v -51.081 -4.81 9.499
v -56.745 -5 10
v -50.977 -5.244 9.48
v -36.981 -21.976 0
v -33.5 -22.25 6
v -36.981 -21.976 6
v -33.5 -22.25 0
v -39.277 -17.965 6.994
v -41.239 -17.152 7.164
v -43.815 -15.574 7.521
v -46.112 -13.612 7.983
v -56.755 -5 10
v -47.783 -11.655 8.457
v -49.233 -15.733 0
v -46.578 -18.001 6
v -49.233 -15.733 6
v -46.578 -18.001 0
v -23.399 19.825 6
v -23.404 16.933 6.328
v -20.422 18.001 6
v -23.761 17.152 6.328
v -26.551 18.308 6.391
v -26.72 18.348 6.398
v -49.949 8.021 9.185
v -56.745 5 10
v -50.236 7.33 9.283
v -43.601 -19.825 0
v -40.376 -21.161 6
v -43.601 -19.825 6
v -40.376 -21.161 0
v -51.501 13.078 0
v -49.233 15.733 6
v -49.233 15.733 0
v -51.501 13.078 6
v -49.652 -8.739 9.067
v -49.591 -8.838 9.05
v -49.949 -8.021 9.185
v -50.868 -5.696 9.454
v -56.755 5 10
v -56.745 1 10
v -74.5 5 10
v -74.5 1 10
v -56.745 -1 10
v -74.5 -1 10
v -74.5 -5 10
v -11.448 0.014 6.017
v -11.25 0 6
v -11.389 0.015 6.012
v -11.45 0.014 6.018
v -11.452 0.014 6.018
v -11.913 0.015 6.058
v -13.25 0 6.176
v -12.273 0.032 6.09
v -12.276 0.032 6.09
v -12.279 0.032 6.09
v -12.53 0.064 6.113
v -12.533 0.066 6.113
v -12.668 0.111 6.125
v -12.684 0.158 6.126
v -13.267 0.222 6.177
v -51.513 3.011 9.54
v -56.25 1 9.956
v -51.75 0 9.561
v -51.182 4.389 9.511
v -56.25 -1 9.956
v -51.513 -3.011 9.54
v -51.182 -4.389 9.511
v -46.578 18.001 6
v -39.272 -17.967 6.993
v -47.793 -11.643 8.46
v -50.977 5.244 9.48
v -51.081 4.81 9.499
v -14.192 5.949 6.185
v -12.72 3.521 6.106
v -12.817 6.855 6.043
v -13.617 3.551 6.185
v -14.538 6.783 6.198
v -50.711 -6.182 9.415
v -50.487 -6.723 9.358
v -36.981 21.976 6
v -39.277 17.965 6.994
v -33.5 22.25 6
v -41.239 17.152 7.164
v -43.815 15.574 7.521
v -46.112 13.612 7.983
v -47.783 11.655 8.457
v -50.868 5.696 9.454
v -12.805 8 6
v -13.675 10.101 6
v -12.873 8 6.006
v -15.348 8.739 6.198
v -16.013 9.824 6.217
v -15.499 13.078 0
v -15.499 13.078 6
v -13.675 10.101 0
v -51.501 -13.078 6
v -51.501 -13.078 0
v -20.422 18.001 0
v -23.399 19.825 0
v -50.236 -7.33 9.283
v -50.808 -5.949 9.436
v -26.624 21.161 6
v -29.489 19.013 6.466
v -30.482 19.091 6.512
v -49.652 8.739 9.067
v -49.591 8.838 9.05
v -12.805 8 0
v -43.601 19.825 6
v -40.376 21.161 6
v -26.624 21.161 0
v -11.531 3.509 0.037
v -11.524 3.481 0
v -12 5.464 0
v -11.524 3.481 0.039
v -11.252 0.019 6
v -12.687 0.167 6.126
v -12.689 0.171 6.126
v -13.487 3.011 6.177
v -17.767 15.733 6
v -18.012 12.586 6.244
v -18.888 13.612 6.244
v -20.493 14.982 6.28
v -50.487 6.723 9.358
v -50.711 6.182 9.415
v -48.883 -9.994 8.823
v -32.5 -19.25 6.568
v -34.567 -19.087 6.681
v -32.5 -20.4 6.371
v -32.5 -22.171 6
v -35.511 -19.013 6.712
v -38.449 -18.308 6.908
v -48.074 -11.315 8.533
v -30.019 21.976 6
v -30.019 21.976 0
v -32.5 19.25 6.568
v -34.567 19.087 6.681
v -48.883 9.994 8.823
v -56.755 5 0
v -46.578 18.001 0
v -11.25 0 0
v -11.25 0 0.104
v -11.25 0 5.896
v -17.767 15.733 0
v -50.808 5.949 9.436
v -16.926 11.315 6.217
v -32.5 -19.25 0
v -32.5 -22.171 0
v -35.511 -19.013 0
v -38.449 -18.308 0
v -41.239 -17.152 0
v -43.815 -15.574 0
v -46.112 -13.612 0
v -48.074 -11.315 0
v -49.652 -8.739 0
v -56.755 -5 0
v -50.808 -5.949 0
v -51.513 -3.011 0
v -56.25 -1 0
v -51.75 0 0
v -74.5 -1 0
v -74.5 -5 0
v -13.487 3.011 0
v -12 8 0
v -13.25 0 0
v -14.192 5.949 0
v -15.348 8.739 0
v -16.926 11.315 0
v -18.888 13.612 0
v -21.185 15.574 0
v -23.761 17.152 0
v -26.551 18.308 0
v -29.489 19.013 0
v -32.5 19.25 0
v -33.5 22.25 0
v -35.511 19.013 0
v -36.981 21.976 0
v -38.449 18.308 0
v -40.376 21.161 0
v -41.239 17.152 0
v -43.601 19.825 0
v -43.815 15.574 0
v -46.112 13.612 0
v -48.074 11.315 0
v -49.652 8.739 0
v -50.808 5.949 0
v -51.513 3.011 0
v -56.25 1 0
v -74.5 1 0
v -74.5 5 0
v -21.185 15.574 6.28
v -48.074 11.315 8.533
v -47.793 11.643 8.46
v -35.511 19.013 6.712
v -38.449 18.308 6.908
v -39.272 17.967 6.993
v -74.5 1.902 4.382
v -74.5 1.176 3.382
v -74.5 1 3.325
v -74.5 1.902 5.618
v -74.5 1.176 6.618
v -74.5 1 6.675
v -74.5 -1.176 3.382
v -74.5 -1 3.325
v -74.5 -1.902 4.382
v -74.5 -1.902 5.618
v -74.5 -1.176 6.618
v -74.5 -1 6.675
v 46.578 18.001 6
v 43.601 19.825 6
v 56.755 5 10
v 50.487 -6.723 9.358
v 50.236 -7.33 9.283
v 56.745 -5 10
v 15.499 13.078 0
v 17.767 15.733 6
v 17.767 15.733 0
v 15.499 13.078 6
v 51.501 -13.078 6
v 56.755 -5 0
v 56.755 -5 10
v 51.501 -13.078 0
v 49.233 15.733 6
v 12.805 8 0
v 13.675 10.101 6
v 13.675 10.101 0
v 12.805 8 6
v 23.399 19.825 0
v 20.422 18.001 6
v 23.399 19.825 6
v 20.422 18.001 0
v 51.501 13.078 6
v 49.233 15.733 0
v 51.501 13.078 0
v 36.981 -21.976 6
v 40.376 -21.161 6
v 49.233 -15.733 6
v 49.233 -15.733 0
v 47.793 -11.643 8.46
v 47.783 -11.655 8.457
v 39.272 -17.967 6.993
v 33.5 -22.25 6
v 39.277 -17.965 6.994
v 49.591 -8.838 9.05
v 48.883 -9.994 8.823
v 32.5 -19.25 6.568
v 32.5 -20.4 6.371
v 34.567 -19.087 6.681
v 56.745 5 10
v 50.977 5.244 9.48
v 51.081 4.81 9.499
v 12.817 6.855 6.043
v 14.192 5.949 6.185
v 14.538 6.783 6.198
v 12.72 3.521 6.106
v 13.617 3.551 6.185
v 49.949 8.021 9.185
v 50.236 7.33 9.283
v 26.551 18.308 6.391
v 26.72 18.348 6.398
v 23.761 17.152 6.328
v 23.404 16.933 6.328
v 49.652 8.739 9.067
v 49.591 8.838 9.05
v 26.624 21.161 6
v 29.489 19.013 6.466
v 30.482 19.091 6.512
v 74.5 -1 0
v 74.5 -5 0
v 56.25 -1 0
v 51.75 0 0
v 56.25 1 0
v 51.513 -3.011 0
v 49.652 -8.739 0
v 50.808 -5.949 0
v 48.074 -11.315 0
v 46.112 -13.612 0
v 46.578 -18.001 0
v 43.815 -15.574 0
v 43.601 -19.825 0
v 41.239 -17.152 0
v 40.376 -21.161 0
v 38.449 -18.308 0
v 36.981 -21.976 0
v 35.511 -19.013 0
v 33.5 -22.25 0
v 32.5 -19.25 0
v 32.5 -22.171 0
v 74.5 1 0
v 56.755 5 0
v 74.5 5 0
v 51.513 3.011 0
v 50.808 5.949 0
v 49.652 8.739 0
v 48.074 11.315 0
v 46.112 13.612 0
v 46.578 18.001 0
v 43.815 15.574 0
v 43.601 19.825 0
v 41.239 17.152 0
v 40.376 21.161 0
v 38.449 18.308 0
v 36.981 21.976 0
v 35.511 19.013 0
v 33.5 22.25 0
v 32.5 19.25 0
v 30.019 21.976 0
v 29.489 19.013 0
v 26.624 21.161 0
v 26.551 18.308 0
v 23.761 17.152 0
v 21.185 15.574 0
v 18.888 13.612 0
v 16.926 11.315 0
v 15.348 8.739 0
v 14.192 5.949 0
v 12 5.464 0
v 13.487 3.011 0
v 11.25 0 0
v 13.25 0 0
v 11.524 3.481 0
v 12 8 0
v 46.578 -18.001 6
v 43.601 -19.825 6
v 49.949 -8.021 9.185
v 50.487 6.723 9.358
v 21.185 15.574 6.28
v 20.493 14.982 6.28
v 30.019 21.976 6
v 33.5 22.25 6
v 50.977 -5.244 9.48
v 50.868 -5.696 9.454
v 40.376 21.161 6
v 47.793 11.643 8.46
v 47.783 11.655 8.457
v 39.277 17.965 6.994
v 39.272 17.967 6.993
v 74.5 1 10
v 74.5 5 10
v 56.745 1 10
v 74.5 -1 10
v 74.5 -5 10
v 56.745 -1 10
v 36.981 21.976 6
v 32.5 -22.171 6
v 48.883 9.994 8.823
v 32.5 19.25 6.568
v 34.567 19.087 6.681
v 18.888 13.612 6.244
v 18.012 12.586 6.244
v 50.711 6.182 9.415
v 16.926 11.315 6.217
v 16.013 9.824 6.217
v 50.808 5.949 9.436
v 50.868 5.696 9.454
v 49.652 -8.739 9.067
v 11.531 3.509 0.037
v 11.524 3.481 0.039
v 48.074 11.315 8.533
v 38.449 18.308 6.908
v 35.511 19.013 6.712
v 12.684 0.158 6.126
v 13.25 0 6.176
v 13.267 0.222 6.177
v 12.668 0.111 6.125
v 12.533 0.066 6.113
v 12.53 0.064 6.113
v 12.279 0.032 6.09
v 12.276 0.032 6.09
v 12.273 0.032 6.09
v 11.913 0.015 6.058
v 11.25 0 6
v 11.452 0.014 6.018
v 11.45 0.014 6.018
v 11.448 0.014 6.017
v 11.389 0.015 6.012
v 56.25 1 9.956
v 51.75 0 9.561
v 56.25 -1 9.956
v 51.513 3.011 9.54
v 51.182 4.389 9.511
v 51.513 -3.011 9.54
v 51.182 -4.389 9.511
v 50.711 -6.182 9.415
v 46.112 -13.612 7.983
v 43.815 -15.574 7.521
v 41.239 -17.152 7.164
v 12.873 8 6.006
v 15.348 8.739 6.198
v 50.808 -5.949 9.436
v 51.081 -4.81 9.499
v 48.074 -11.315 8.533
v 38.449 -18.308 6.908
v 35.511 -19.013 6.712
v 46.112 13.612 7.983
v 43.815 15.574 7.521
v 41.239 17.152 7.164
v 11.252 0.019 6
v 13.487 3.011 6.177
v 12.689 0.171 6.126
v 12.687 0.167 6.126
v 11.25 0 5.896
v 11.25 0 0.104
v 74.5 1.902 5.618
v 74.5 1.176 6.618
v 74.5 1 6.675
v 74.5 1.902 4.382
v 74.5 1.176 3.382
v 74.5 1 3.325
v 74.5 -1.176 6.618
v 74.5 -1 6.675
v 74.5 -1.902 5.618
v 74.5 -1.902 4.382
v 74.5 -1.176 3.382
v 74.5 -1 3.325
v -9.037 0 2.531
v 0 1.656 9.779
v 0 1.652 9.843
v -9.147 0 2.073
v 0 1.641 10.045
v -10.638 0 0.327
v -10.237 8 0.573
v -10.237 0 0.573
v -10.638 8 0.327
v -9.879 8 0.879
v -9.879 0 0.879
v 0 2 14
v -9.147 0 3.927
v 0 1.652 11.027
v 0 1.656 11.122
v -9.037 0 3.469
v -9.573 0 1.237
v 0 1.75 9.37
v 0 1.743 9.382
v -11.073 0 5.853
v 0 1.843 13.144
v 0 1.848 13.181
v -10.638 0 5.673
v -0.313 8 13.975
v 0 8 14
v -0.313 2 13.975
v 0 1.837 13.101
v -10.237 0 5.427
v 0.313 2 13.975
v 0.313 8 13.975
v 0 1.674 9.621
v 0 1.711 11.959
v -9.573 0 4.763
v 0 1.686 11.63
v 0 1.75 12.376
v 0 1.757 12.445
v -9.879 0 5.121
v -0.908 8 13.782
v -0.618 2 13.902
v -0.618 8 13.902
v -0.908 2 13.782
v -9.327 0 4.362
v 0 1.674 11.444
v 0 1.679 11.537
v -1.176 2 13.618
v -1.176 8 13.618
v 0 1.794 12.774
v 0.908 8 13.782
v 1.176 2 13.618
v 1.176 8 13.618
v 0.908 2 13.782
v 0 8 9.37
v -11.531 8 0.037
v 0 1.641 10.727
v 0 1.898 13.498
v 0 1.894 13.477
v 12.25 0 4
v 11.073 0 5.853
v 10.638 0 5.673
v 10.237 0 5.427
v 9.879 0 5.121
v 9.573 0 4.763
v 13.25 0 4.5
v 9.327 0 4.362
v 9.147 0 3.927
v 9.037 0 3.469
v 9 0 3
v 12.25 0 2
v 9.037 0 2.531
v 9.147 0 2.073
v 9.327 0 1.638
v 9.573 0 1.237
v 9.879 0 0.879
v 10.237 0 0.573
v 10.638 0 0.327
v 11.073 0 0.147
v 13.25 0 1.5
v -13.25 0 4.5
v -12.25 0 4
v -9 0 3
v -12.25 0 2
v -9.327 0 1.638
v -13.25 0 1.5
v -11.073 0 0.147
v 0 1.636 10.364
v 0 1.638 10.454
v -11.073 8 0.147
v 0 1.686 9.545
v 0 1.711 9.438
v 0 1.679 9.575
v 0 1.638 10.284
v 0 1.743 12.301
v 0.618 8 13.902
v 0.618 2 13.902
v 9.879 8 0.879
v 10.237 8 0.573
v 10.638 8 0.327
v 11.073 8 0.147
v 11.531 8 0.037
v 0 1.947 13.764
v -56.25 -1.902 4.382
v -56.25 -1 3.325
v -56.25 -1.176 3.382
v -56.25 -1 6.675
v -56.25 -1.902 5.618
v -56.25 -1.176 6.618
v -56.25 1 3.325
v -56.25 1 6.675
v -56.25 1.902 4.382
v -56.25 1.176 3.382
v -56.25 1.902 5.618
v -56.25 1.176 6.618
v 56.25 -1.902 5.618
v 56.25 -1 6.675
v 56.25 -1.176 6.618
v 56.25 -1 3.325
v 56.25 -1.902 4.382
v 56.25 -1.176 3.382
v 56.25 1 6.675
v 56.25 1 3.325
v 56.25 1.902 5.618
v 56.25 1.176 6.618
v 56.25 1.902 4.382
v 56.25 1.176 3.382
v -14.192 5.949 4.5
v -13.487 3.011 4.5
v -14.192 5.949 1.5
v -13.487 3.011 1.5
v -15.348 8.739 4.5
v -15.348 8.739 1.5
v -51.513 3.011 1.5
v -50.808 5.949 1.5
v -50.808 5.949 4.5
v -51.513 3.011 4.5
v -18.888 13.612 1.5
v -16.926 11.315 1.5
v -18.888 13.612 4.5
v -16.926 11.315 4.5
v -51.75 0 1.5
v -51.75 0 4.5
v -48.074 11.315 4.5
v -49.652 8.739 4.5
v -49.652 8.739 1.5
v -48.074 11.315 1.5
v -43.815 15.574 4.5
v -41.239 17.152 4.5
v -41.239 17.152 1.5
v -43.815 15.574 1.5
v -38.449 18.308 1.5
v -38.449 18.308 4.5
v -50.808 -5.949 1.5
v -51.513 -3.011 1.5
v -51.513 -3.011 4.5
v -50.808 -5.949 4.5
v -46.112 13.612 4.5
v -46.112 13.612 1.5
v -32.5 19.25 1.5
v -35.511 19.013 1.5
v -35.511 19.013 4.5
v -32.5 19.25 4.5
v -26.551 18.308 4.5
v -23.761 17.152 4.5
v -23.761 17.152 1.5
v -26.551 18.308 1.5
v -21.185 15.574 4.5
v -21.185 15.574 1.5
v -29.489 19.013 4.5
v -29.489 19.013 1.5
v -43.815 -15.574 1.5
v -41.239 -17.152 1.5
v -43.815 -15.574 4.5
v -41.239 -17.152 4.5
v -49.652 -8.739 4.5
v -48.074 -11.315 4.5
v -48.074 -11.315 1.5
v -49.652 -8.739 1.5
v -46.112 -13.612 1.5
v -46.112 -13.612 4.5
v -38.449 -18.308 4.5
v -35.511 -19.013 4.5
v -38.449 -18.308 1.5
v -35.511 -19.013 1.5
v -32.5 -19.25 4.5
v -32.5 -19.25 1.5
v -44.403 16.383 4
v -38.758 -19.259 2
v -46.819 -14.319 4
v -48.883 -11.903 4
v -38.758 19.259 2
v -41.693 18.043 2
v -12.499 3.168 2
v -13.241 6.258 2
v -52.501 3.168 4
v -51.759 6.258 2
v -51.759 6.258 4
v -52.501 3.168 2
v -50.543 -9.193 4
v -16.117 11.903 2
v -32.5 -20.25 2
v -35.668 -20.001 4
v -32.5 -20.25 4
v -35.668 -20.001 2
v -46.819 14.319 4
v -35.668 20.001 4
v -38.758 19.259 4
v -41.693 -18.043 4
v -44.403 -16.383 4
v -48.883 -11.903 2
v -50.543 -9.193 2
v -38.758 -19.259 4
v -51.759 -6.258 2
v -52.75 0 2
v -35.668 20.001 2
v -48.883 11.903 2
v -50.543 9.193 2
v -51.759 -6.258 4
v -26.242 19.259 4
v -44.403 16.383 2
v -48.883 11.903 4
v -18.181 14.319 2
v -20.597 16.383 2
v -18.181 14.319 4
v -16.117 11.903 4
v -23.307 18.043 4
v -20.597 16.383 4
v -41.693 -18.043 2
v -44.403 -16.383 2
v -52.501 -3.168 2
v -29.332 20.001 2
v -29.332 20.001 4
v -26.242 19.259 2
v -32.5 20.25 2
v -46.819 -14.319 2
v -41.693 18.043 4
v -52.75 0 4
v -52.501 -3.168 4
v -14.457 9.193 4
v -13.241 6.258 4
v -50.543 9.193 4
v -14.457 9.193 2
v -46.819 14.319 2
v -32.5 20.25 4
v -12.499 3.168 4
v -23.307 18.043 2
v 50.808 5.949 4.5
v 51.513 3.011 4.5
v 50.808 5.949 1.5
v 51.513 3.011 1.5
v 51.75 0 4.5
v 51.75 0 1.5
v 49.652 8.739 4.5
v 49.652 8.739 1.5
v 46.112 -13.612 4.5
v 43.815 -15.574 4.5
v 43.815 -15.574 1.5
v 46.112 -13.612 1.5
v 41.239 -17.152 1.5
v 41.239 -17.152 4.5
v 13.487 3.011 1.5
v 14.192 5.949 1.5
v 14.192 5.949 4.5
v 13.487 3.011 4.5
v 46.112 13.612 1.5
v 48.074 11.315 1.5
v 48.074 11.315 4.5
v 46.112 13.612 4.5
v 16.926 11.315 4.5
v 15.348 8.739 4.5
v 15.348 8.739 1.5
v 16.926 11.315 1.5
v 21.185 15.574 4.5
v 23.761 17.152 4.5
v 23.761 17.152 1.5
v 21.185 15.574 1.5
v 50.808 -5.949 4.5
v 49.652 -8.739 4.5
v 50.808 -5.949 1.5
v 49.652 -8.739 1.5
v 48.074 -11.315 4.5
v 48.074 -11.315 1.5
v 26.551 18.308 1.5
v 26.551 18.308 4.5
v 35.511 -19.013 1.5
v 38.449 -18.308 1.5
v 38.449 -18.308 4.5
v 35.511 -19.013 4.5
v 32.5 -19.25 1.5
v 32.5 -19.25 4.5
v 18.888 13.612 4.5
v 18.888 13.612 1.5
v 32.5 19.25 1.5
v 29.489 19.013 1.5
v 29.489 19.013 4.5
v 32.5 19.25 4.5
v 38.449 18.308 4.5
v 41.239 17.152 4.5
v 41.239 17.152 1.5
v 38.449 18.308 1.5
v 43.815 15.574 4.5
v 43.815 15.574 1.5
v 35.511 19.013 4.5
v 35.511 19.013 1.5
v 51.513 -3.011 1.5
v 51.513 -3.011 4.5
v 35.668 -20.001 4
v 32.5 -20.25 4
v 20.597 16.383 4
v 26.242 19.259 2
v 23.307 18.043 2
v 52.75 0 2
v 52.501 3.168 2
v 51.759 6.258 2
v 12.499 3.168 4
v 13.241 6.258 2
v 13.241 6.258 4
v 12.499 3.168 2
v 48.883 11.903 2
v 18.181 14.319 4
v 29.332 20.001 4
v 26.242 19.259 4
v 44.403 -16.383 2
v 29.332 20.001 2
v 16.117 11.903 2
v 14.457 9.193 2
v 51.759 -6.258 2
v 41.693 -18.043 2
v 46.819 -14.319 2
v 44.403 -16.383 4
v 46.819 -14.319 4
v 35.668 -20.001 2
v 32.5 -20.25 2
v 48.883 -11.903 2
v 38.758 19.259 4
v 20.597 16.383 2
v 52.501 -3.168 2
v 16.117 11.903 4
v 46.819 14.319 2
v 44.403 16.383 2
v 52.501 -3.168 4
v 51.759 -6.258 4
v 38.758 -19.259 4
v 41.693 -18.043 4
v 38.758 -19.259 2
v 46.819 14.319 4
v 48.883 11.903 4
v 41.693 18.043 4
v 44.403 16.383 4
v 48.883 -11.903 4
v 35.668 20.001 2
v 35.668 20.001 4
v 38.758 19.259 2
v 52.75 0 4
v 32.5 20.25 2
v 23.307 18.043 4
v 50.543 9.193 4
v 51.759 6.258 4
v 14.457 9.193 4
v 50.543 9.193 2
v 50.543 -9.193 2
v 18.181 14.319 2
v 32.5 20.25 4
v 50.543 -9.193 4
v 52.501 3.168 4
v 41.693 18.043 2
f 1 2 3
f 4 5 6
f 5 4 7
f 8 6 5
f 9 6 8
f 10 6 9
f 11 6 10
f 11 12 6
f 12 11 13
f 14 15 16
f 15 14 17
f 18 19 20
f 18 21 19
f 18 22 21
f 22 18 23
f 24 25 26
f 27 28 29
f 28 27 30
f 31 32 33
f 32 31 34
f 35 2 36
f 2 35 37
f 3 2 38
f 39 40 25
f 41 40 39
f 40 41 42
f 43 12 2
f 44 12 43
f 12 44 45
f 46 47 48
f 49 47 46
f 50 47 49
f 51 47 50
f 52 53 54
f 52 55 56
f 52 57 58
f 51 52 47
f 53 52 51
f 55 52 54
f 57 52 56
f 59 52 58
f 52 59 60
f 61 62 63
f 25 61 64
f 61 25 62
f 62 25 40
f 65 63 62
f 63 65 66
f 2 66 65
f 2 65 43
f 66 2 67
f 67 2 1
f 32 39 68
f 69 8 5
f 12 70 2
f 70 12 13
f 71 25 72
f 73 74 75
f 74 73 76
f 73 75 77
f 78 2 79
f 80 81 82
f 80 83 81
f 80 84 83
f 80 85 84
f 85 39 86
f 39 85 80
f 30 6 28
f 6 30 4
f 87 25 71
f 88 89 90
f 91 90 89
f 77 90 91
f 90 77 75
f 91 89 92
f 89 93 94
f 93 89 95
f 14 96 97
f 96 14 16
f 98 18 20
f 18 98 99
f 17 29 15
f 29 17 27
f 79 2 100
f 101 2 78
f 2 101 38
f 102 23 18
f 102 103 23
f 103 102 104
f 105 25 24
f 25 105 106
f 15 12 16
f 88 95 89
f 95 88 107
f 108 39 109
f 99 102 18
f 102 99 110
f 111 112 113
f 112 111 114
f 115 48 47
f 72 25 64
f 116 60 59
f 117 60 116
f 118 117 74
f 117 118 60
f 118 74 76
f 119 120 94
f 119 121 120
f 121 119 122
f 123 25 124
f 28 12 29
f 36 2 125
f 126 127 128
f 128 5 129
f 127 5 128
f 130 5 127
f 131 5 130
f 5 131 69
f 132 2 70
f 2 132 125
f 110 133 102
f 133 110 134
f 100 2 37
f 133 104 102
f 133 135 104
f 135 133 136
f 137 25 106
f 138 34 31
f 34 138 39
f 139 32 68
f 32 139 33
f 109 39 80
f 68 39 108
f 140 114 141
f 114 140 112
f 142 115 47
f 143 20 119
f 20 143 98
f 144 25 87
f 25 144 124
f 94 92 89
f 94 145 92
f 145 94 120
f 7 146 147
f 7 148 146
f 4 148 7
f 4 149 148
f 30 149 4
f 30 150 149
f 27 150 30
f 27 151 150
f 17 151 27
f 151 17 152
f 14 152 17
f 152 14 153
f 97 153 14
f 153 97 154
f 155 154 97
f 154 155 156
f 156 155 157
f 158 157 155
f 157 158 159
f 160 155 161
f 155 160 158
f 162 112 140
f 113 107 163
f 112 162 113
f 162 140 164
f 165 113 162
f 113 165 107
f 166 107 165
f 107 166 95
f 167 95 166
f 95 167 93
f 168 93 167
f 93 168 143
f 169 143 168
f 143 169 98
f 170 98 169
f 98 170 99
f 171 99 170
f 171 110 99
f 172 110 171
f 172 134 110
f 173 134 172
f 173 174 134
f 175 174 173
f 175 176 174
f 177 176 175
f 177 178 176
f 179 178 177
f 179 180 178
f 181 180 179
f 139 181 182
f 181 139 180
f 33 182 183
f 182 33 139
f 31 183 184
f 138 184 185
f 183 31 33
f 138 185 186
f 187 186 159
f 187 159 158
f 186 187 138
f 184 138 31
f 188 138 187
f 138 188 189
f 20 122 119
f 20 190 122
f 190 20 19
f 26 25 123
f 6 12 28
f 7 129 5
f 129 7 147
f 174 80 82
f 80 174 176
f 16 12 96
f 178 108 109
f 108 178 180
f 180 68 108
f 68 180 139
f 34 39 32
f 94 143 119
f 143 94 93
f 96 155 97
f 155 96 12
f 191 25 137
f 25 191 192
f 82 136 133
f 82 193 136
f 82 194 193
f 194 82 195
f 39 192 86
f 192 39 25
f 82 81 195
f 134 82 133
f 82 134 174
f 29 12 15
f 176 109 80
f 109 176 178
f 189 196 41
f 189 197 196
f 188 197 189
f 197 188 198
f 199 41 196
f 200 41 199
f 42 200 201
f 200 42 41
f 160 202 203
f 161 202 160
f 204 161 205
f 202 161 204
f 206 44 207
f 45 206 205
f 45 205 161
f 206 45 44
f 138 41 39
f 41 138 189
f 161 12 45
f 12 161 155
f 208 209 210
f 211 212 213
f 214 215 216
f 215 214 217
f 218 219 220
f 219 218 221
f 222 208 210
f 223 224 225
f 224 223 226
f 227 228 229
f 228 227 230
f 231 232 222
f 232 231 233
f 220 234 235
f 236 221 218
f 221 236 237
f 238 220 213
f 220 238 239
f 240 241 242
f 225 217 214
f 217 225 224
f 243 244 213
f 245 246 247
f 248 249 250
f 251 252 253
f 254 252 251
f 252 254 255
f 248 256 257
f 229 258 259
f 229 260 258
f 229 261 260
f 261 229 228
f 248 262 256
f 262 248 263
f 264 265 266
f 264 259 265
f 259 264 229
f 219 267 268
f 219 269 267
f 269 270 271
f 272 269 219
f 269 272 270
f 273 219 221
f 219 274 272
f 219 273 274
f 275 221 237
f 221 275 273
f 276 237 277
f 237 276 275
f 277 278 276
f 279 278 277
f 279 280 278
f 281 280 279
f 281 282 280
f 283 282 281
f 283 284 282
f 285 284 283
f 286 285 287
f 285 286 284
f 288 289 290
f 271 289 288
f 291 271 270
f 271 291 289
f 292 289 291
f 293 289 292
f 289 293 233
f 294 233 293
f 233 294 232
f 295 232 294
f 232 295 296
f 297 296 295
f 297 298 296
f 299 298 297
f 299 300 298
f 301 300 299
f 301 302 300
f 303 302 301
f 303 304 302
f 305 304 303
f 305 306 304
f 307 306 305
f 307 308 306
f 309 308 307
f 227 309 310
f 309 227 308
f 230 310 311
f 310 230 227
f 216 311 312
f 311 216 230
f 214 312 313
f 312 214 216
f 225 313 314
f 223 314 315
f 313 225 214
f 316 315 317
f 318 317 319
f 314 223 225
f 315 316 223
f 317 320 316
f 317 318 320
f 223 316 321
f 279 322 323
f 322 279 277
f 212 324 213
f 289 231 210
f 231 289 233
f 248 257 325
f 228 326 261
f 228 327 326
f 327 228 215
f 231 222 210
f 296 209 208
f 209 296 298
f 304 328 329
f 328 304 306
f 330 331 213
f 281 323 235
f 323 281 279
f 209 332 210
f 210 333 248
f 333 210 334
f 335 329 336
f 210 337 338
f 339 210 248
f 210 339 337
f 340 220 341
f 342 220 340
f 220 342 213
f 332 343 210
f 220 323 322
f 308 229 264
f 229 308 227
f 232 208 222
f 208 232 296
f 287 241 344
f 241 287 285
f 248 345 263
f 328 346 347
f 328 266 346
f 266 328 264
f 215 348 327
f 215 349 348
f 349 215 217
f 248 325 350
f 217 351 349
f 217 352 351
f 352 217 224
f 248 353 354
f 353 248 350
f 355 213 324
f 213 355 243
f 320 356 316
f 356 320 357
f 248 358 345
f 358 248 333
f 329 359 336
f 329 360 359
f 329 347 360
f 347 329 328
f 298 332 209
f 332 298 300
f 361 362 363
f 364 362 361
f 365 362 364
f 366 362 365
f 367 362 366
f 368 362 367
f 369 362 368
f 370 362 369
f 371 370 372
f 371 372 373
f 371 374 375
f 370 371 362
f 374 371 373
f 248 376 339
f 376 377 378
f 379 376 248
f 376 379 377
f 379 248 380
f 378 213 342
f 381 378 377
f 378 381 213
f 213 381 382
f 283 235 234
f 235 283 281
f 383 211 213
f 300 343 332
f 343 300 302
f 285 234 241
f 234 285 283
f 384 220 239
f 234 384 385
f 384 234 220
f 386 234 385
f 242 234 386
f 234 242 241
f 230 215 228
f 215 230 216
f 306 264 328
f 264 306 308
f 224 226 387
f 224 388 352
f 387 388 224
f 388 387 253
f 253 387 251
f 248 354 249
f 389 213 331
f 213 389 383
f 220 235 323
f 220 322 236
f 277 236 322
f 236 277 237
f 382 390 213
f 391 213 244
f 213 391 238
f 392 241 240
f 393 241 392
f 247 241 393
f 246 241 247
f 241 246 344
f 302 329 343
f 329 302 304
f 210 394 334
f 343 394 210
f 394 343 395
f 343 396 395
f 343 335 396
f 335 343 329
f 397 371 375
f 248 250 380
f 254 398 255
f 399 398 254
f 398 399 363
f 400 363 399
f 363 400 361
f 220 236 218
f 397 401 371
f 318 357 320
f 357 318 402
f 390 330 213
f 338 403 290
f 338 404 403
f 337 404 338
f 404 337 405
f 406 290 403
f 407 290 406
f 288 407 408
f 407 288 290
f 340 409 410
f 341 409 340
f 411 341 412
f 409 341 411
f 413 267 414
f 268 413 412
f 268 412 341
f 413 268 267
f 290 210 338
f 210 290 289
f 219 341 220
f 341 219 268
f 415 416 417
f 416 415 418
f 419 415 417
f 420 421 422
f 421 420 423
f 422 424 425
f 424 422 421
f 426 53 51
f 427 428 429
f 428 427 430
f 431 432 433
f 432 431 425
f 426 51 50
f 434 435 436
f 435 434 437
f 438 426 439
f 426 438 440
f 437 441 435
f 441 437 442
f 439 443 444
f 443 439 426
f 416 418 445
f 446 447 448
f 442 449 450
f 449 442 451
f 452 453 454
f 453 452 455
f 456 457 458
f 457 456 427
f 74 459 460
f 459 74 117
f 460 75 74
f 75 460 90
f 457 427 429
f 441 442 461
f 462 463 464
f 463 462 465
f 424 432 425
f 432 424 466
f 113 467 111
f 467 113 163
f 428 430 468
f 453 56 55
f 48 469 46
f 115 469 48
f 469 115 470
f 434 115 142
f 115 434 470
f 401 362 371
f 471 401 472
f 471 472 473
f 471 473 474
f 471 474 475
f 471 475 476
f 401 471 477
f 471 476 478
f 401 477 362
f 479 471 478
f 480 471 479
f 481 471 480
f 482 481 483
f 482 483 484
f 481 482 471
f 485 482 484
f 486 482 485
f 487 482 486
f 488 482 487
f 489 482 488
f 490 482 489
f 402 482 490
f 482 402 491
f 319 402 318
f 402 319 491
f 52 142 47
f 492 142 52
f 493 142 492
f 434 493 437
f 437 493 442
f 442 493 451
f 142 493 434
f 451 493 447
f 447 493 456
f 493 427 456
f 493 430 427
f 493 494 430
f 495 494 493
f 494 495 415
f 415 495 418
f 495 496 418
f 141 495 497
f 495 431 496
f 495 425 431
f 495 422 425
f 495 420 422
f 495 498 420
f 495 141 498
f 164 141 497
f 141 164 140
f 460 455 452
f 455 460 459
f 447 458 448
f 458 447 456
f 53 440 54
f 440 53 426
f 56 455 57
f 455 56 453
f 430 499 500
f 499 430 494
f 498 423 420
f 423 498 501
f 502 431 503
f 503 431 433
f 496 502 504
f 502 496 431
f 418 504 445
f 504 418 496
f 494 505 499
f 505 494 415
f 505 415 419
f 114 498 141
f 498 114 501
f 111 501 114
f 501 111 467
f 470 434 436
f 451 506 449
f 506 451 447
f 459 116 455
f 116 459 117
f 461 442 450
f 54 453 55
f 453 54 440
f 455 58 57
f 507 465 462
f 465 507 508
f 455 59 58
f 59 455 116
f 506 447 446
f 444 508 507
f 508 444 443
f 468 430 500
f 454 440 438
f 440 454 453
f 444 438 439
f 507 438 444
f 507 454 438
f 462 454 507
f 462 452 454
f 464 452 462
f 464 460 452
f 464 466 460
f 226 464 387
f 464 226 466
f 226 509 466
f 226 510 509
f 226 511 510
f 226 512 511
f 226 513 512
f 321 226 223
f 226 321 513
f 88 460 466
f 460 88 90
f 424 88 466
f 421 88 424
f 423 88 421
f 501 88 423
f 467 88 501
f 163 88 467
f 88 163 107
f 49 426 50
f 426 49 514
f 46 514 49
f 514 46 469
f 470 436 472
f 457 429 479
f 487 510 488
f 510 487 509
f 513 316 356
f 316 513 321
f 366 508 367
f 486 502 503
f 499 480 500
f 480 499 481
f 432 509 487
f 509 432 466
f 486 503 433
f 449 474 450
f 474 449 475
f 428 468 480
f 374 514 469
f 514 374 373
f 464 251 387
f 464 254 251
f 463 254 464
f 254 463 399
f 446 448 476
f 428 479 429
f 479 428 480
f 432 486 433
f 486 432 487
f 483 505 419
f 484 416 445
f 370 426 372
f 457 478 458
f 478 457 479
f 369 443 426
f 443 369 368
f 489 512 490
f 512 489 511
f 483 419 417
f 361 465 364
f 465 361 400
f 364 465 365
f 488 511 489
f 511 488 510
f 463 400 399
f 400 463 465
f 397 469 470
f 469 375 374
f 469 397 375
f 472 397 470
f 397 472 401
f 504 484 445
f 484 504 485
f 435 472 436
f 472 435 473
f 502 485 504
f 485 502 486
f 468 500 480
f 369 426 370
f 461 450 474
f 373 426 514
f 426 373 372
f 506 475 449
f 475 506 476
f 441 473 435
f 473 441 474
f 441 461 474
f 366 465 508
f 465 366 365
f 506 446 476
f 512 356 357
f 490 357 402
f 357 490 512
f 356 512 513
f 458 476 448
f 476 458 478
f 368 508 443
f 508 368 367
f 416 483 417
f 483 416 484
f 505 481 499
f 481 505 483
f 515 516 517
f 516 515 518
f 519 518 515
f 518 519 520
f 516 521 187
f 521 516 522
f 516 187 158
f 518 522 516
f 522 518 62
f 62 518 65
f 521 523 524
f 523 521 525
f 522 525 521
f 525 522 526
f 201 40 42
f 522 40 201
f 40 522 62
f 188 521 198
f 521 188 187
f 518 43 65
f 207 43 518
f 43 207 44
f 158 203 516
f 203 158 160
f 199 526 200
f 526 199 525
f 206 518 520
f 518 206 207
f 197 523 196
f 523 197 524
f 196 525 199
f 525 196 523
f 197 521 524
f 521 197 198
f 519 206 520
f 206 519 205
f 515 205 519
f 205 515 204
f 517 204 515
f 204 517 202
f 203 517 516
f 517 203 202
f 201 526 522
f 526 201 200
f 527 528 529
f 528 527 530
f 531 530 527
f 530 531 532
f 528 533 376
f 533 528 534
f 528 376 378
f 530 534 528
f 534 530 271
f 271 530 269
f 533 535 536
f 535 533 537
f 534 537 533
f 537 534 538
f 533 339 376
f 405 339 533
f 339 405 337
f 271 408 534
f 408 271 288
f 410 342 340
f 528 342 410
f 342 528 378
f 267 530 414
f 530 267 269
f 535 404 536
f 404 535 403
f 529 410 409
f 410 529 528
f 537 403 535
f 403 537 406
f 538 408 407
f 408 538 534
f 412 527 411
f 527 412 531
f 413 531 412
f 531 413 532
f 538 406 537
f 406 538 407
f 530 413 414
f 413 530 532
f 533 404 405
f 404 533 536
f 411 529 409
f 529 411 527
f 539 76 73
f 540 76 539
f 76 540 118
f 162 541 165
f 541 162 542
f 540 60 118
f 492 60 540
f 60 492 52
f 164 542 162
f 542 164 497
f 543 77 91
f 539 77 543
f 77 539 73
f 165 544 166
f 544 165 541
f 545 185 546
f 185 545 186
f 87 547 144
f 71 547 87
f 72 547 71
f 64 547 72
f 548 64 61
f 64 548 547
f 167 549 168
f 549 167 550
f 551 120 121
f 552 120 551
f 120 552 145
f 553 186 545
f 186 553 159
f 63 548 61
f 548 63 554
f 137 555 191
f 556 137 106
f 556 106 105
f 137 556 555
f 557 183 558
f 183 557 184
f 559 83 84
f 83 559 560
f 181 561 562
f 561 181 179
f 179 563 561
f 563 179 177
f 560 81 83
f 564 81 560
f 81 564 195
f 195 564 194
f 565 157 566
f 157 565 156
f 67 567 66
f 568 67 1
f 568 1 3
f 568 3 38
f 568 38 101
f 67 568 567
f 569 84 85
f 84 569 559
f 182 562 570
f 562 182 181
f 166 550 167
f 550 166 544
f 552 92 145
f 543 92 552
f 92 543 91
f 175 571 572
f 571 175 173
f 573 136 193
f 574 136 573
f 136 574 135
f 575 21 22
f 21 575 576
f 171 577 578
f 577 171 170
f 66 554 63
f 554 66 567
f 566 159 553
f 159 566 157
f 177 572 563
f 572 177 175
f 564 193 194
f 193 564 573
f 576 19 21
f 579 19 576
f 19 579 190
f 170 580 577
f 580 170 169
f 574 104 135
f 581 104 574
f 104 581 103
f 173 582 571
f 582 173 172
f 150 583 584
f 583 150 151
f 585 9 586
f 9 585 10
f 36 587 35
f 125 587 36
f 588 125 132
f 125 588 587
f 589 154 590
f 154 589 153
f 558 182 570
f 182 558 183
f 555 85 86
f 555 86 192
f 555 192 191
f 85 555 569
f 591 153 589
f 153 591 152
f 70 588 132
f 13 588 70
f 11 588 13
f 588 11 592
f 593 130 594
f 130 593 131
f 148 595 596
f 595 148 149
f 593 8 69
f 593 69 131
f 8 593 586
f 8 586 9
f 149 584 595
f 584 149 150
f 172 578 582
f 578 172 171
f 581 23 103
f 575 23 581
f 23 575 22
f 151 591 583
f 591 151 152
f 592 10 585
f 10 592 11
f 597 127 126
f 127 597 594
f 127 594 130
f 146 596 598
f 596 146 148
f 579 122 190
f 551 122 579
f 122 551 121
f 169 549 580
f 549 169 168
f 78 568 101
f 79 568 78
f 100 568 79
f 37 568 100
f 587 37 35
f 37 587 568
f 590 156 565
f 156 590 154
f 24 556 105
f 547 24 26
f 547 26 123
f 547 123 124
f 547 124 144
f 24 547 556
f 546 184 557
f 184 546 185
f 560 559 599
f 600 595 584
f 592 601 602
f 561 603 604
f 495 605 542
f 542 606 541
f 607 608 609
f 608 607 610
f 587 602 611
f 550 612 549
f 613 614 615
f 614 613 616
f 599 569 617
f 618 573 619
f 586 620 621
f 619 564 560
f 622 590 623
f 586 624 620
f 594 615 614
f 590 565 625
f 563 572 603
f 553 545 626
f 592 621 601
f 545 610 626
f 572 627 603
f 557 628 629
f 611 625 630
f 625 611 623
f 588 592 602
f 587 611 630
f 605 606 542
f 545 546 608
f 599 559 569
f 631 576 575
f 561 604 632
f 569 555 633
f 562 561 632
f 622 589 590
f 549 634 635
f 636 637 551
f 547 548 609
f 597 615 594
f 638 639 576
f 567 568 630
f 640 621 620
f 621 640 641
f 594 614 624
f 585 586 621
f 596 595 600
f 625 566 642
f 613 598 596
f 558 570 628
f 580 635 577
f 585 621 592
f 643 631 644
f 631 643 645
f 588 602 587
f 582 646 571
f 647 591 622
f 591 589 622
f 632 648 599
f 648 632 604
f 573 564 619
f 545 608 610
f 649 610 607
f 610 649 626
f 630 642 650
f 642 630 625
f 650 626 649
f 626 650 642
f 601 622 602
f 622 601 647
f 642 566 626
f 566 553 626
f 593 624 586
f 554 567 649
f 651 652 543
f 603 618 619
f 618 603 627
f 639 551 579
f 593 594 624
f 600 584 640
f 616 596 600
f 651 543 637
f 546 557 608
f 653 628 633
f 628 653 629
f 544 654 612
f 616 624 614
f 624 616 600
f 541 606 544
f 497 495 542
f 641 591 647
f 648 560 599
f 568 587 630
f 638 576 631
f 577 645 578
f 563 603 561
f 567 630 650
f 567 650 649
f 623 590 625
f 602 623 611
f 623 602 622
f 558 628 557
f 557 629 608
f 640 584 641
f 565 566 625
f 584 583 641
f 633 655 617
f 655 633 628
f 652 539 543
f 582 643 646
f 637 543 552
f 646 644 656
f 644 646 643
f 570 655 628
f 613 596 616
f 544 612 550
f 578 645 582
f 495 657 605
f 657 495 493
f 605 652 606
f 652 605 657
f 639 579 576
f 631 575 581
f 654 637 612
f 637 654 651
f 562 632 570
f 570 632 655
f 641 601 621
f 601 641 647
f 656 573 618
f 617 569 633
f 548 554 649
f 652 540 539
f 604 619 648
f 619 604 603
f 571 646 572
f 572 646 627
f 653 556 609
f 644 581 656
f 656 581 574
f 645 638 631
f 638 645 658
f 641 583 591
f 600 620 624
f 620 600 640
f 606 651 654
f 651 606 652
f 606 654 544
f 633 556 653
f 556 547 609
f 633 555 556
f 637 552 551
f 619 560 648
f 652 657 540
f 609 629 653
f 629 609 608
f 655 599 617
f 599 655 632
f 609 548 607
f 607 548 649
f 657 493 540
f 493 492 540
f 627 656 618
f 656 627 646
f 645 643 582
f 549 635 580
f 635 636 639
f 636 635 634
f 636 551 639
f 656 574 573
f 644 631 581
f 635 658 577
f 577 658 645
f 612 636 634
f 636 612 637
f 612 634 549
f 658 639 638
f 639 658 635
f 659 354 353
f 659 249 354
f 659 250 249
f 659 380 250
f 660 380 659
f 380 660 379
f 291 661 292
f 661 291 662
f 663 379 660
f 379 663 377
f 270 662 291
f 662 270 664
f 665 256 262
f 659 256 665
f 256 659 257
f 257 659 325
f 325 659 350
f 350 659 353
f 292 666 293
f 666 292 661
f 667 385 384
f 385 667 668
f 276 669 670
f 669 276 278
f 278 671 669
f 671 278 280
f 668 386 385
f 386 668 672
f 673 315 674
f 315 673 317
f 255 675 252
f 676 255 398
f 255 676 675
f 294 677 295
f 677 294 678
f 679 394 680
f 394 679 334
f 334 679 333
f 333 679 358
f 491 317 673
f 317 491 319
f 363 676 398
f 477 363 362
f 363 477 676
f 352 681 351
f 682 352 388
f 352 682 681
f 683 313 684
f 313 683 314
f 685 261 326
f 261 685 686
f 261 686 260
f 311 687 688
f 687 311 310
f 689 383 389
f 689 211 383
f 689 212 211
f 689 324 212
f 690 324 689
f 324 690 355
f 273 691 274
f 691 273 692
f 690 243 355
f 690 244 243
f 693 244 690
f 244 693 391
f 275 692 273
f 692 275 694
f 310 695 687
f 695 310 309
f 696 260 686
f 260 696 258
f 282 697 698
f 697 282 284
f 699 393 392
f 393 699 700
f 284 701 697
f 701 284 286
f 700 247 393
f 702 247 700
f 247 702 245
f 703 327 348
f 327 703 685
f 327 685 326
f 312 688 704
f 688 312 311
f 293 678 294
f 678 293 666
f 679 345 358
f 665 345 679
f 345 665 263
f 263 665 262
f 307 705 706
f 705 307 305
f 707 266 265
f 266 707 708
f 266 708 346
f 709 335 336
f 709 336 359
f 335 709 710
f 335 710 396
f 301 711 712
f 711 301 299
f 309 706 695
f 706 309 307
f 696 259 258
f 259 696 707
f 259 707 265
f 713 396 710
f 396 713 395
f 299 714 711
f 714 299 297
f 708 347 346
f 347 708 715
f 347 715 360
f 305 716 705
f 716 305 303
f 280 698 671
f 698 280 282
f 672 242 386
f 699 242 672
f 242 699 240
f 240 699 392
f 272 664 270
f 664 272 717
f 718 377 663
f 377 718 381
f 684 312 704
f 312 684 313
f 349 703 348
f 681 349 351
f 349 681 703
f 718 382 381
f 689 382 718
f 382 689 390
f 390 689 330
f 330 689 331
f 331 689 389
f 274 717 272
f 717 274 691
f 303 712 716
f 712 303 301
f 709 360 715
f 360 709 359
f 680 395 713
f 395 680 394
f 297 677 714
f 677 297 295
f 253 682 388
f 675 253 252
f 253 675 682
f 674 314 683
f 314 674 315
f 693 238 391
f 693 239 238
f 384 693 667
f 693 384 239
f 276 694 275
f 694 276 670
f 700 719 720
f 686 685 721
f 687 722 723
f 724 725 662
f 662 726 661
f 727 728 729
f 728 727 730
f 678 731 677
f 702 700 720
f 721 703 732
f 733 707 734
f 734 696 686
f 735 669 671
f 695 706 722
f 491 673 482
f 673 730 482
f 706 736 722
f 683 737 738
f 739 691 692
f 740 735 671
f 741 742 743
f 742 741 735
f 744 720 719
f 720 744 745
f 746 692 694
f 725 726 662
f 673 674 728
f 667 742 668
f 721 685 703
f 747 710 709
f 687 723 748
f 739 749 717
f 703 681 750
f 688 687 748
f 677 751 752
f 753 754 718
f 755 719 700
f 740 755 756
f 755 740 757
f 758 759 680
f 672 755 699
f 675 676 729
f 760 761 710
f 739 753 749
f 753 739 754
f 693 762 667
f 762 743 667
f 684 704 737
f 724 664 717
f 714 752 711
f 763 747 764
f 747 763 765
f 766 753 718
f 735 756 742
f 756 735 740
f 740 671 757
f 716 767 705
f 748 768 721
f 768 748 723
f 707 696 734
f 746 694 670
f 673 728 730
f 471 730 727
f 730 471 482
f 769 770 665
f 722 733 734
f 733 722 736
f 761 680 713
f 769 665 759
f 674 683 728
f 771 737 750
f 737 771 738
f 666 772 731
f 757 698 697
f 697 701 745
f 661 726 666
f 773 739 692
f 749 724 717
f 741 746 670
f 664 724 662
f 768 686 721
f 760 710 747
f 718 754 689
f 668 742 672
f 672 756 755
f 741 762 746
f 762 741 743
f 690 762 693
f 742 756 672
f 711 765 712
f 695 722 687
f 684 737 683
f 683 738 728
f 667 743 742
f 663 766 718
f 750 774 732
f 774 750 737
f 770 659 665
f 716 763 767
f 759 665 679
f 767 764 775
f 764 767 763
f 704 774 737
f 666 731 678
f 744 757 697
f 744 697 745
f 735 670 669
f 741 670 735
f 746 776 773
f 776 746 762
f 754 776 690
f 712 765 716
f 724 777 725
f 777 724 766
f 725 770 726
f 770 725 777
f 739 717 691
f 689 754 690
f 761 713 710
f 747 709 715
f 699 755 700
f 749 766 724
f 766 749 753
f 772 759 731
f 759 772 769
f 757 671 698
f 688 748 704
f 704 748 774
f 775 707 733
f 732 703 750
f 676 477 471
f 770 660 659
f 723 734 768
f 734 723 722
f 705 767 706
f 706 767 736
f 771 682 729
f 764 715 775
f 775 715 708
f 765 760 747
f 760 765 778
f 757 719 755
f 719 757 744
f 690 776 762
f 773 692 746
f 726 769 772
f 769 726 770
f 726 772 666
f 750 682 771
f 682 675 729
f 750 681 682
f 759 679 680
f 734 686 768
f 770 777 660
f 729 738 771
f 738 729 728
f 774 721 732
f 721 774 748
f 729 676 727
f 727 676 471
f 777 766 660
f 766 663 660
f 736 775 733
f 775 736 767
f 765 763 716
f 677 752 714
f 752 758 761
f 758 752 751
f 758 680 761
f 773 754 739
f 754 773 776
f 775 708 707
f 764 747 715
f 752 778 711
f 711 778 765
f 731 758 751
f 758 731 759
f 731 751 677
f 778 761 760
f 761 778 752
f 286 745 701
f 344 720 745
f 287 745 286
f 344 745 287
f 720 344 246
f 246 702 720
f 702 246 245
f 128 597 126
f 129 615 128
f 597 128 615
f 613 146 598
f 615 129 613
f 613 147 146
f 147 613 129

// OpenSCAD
// parametric lens holder for Note4 VR OpenDive Headset (and others)

IPD = 65; // Inter-Pupillary Distance. How far apart the center of the two lenses will be.
lensSize1 = 40.5; // diameter of one of the lenses you are using
lensSize2 = 40.5; // diameter of the other lens you are using
visorWidth = 149; // outer width of the visor.  this is how wide the lens clip will be
slotWidth = 10; // how wide the slots for the lens clip are
lensThickness = 2; // thickness of the edge of the lens

/* [Hidden] */
$fn=40;
lensLip = 1; // how big the rim of plastic holding the lens in will be
mountStart = (IPD+(lensSize1 + lensSize2)/2)/2 + 4; // an intermediate value
mountMid = (visorWidth/2-mountStart)/2 + mountStart;

lensClip();

module lensClip()
{
	difference ()
	{
		union()
		{
			hull()
			{
				translate([-(IPD/2+1),0,lensThickness/2 + 2])	cylinder(r=lensSize1/2 + 2, h=lensThickness +4, center=true);
				translate([-mountStart, 0, 5]) cube([.01, slotWidth, 10], center=true);
			}
			translate([-mountMid, 0, 5]) cube([visorWidth/2 - mountStart, slotWidth, 10], center=true);

			hull()
			{
				translate([(IPD/2+1),0,lensThickness/2 + 2])	cylinder(r=lensSize2/2 + 2, h=lensThickness +4, center=true);
				translate([mountStart, 0, 5]) cube([.01, slotWidth, 10], center=true);
			}
			translate([mountMid, 0, 5]) cube([visorWidth/2 - mountStart, slotWidth, 10], center=true);
			
			// crosspiece
			hull()
			{
				translate([0, 5, 12]) rotate([90,0,0]) cylinder(r=2,h=6,center=true);
				translate([-12, 4, 3]) rotate([90,0,0]) cylinder(r=3,h=8,center=true);
			}
			hull()
			{
				translate([0, 5, 12]) rotate([90,0,0]) cylinder(r=2,h=6,center=true);
				translate([12, 4, 3]) rotate([90,0,0]) cylinder(r=3,h=8,center=true);
			}
			translate([-(IPD/4 + 6),4,3]) cube([IPD/2-12,8,6], center=true);
			translate([(IPD/4 + 6),4,3]) cube([IPD/2-12,8,6], center=true);
		}
	
	// slot mount cutouts
	translate ([-mountMid, 0, 5])
	{
		cube([visorWidth/2 - mountStart + 1, 2, 11],center=true);
		rotate([0,90,0]) cylinder(r=2, h=visorWidth/2 - mountStart + 1, center=true, $fn=10);
	}

	translate ([mountMid, 0, 5])
	{
		cube([visorWidth/2 - mountStart + 1, 2, 11],center=true);
		rotate([0,90,0]) cylinder(r=2, h=visorWidth/2 - mountStart + 1, center=true, $fn=10);
	}
	// lens cutouts
	translate ([-IPD/2,0,lensThickness/2 + 2]) lensCutOut(lensSize1);
	translate ([IPD/2,0,lensThickness/2 + 2]) lensCutOut(lensSize2);
	
	// lens gap
	translate([0,-50,3]) cube([IPD,100,50], center=true);

	}
}

module lensCutOut(lensSize)
{
	union()
	{
		cylinder(r=lensSize/2 - lensLip, h=100, center=true);
		
		// creating a bevel
		hull()
		{
			cylinder(r=lensSize/2, h=lensThickness, center=true);
			cylinder(r=lensSize/2-lensLip, h=lensThickness + lensLip, center=true);
		}
	}
}
